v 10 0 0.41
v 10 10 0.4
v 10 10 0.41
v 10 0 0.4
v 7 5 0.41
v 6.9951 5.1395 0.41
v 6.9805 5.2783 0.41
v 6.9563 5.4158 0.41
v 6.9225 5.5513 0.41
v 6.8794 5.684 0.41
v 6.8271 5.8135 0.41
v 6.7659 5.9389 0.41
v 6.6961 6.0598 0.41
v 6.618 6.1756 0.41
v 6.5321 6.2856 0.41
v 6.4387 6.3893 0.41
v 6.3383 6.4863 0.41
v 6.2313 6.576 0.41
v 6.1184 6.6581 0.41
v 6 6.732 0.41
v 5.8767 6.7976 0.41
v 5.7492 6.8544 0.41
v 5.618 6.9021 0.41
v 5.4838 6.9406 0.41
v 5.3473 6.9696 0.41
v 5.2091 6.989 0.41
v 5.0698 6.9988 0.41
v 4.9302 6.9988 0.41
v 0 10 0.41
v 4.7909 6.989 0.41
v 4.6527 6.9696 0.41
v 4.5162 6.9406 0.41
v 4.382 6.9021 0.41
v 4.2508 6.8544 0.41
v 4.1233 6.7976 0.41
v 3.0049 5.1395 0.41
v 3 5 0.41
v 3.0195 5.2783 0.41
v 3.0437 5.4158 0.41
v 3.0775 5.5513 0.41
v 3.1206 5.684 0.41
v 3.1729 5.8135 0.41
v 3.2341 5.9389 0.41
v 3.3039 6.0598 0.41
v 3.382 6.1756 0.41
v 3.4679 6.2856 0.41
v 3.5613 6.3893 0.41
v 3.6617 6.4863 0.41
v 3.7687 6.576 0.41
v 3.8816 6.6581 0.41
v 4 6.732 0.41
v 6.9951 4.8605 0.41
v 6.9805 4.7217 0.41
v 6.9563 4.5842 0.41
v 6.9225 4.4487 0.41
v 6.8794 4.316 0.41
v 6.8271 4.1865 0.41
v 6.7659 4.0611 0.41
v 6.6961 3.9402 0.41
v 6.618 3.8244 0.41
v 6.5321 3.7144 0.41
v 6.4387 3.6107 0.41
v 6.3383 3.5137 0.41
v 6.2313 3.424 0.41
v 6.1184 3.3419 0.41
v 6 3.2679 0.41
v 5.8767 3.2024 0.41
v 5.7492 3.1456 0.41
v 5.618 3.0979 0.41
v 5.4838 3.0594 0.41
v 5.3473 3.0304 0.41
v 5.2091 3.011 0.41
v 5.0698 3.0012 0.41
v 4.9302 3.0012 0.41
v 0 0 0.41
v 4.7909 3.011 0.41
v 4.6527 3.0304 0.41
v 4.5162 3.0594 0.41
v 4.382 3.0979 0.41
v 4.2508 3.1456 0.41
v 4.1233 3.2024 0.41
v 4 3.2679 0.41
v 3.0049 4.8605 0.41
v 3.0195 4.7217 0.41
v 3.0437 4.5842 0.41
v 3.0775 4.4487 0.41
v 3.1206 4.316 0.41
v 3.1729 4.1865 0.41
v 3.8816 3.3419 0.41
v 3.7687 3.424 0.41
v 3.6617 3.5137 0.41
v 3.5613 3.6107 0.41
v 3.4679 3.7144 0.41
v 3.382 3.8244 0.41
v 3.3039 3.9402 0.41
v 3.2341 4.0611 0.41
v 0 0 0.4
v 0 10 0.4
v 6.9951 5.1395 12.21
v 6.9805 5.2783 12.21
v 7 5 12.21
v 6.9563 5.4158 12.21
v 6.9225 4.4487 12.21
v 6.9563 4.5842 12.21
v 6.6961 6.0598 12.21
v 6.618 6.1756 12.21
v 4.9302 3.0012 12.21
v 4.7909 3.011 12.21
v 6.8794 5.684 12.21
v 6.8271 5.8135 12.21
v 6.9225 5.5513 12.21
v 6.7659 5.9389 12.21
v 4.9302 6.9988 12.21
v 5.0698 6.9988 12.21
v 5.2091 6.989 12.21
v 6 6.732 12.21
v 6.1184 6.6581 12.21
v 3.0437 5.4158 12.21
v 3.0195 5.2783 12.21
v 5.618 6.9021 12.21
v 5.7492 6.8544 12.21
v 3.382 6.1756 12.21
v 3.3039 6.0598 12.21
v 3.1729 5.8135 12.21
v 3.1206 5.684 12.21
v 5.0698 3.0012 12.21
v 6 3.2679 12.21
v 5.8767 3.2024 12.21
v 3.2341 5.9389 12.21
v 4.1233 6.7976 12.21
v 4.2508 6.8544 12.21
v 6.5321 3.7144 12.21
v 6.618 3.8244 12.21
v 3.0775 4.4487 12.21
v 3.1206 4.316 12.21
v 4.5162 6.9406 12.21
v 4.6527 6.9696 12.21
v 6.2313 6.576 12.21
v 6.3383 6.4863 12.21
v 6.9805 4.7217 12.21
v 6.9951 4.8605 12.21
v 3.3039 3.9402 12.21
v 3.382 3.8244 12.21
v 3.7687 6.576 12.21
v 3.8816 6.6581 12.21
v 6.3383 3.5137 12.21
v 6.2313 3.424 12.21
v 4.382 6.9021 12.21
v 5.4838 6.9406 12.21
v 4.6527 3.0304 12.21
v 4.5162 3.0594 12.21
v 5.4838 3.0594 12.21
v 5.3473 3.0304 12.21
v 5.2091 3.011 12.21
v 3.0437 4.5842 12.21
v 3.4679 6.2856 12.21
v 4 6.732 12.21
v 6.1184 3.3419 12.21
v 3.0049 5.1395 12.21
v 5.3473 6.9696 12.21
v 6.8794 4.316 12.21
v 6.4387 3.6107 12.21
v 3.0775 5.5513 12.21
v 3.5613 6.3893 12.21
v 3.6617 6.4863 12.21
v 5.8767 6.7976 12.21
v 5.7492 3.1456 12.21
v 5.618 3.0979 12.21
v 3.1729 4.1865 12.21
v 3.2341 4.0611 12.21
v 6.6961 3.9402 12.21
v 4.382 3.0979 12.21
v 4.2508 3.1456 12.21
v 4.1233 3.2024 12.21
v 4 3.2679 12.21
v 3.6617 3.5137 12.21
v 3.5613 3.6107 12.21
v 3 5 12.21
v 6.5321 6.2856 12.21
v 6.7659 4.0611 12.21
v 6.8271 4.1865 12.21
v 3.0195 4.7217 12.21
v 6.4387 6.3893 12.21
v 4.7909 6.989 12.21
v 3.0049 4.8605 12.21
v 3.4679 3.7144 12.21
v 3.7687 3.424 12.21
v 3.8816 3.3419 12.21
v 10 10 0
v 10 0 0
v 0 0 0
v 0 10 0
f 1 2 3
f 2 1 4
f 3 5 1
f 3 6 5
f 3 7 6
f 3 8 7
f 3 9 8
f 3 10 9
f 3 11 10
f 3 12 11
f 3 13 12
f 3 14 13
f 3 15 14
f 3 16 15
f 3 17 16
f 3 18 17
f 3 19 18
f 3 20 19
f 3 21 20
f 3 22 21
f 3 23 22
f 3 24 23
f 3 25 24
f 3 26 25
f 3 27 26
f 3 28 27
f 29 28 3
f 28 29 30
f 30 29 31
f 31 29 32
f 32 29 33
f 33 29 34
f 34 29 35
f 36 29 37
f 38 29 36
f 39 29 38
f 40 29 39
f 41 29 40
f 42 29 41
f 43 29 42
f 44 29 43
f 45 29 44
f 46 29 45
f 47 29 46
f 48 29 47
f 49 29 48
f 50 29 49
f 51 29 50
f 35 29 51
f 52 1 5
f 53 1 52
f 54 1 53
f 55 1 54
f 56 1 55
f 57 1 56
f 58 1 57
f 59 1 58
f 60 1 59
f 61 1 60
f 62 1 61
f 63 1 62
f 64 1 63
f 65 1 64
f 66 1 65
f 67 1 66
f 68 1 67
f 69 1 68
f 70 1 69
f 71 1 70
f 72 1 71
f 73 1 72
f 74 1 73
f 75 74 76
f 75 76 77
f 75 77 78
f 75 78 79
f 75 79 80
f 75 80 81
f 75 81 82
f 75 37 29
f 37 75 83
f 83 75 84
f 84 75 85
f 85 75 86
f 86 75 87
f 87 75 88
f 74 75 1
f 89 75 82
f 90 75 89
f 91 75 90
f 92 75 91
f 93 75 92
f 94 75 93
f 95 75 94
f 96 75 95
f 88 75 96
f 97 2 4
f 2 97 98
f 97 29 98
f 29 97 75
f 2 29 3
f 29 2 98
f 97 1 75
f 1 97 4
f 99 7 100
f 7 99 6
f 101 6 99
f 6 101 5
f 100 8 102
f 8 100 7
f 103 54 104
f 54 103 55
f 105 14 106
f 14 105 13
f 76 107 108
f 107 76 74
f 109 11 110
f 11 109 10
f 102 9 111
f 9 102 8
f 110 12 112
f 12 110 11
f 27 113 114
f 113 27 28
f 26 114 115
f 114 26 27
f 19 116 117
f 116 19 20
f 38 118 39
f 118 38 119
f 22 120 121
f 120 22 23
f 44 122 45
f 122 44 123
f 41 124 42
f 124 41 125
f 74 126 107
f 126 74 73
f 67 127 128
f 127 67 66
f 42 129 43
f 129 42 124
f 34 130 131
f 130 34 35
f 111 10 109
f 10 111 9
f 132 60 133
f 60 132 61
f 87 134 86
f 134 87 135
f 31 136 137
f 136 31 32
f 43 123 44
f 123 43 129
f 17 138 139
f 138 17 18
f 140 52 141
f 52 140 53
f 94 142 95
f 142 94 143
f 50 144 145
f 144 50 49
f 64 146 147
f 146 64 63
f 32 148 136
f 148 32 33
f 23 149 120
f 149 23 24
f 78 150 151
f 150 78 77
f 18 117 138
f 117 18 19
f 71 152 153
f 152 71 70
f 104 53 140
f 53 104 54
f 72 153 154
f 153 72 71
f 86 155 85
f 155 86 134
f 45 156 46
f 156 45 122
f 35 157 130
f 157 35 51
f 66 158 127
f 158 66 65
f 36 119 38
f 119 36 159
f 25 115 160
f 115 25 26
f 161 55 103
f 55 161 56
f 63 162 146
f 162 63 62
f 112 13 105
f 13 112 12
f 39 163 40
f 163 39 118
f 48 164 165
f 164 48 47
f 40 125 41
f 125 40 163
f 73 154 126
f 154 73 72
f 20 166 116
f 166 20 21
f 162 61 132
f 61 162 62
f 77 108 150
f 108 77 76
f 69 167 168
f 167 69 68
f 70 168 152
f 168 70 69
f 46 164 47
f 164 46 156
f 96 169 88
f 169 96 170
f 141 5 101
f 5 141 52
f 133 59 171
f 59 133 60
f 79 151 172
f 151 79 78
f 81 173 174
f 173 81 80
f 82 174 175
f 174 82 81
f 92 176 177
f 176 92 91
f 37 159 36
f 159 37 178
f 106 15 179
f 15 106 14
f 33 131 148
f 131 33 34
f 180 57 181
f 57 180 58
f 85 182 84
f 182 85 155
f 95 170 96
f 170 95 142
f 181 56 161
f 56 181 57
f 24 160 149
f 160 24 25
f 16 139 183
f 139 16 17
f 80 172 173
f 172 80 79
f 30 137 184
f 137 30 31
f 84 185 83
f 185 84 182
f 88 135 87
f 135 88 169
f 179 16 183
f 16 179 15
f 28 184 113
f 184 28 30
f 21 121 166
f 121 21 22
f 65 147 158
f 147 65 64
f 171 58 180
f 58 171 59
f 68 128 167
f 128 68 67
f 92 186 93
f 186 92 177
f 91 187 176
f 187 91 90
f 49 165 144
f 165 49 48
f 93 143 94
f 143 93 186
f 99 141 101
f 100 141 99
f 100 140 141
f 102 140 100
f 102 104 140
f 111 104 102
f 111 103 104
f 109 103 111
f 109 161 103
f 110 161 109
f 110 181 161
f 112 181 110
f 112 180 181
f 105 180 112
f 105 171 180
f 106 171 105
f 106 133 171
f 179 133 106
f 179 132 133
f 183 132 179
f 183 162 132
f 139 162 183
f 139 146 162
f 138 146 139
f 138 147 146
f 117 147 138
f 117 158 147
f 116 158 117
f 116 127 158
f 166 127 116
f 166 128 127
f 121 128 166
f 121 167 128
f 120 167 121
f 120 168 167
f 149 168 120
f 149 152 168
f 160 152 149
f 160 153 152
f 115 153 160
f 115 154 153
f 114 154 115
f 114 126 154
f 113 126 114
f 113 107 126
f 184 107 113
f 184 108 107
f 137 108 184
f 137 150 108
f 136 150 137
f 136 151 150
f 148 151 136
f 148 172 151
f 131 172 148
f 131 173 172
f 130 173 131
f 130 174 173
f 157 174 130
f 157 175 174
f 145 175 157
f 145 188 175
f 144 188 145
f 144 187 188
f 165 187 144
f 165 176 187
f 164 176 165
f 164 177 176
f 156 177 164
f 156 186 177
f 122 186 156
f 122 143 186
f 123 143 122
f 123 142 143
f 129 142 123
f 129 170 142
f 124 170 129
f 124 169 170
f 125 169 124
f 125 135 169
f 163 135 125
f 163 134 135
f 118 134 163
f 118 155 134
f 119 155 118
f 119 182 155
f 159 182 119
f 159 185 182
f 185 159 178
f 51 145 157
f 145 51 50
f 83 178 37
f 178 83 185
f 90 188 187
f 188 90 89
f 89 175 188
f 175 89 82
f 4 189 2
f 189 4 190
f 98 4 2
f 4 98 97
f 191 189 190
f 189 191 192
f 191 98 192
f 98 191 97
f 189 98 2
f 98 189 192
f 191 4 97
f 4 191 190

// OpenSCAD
// file: ../../Base/Rotation.scad
// Fischertechnik Box Foundation
// Geometry Helpers Rotation

include <PlacementOptions.scad>

// getRotatedSpace(space, rotation=NoRotation)
// Rotates the space dependent on the specified rotation

function getRotatedSpace(space, rotation=NoRotation) = [
    (rotation == Rotate90 || rotation == Rotate270) ? space.y : space.x,
    (rotation == Rotate90 || rotation == Rotate270) ? space.x : space.y
];

// Rotates the given space around the fixed left lower corner
// space = the space the children needs as width/depth list [width,depth]
// rotation = 0 Rotate0 degrees, 1 Rotate90 degrees, 2 Rotate180 degrees, 3 Rotate270 degrees (equivalent to -90)

module RotateFix(space, rotation=NoRotation) {
    dy = (rotation == Rotate0 || rotation == Rotate270) ? 0 :
        (rotation == Rotate90) ? space.x :
        space.y;
    dx = (rotation < Rotate180) ? 0 :
        (rotation == Rotate180) ? space.x :
        space.y;
    
    translate([dx, dy, 0])
        rotate([0, 0, rotations[rotation]])
            children();
}
// file: ../../Base/Alignment.scad
// Fischertechnik Box Foundation
// Geometry Helpers Alignment

include <PlacementOptions.scad>

// getAlignedX(elementWidth, spaceWidth, align=AlignRight, offset=0)
// Gets the aligned X offset of an element with the given
// width in the given space.
// elementWidth = The width of the element to positon
// spaceWidth = The space where the element should be aligned
// align = 0 AlignLeft, 1 AlignCenter, 2 AlignRight
// offset = an optional offset from the aligned position. When
// aligned left or centered, then positive values are in X direction.
// When aligned right then positive values are in negative X direction.

function getAlignedX(elementWidth, spaceWidth, align=AlignRight, offset=0) =
    (align == AlignLeft) ?
        offset :
        ((align == AlignCenter) ?
        (spaceWidth - elementWidth)/2 + offset :
        spaceWidth - offset - elementWidth);

// getAlignedY(elementDepth, spaceDepth, align=AlignTop, offset=0)
// Gets the aligned Y offset of an element with the given
// depth in the given space.
// elementDepth = The depth of the element to positon
// spaceDepth = The space where the element should be aligned
// align = 0 AlignBottom, 1 AlignCenter, 2 AlignTop
// offset = an optional offset from the aligned position. When
// aligned bottom or centered, then positive values are in Y direction.
// When aligned top then positive values are in negative Y direction.

function getAlignedY(elementDepth, spaceDepth, align=AlignTop, offset=0) =
    (align == AlignBottom) ?
        offset :
        ((align == AlignCenter) ?
        (spaceDepth - elementDepth)/2 + offset :
        spaceDepth - offset - elementDepth);
// file: ../../Base/PlacementOptions.scad
// Fischertechnik Box Foundation
// Placement Options

// Alignment
NoAlign = 0;
AlignLeft = 1;
AlignBottom = 2;
AlignCenter = 3;
AlignRight = 4;
AlignTop = 5;

// Element rotation degree steps
rotations = [0, -90, -180, -270];

// Rotation
NoRotation = 0;
Rotate0 = 0;
Rotate90 = 1;
Rotate180 = 2;
Rotate270 = 3;

// Docking (seen from above)
NoDock = -1;
DockLeft = 0;
DockTop = 1;
DockRight = 2;
DockCorner = 2;
DockBottom = 3;

// Web corners
LowerLeft = 0;
UpperLeft = 1;
UpperRight = 2;
LowerRight = 3;

// Web position relative to corner
LeftOfCorner = 0;
RightOfCorner = 1;
// file: ../../Base/Boxes.scad
// Fischertechnik Box Foundation
// Pre-designed Boxes

use <Constants.scad>

include <PlacementOptions.scad>

box190Width = 190;
box190Depth = 130;
box130Width = 130;
box130Depth = 95;

// Values are from an original ec3 box
topBottomDifference = 1.5;
outerHeight = 40;
innerHeight = 38.2;
baseThickness = outerHeight - innerHeight;
stackExcess = 5.7;
radius = 3.5;
wallThickness = 1.5;
tolerance = 0.2;
stackOffset = innerHeight - stackExcess;

boxUsageHeight = stackOffset;
boxWallThickness = wallThickness;
boxBaseThickness = baseThickness;
boxWebWidth = 3.0;

// getBoxWallThickness()
// Gets the wall thickness of a Fischertechnik Box
function getBoxWallThickness() = boxWallThickness;

// getBoxUsageHeight()
// Gets the usable height of a Fischertechnik box
function getBoxUsageHeight() = boxUsageHeight;

// getBoxInnerHeight()
// Gets the inner height of a Fischertechnik box, including the stack excess
function getBoxInnerHeight() = innerHeight;

// getBoxBaseThickness()
// Gets the thickness of the Fischertechnik box base.
function getBoxBaseThickness() = boxBaseThickness;

// getBoxWebWidth()
// Gets the width of a box web
function getBoxWebWidth() = boxWebWidth;

// getBox190Space()
// Gets the usable inner space of a Box 190 as an x/y-list
function getBox190Space() = [
    box190Width - 2*getBoxWallThickness() - topBottomDifference, 
    box190Depth - 2*getBoxWallThickness() - topBottomDifference ];

// BoxBase(width, depth)
// Creates an empty stackable Fischertechnik compatible box
// width = Outer width of the box (190, 130, ...)
// depth = Outer depth of the box (130, 95, ...)

module BoxBase(width, depth, height=outerHeight) {    
    thinPlate = 0.01;

    innerHeight = height - baseThickness;    
    
    module BodyPlate(width, depth) {
        translate([radius, radius])
        hull() {
            w = width-2*radius;
            d = depth-2*radius;
            cube([w, d, thinPlate]);
            cylinder(thinPlate, r=radius, $fn=getFragments());
            translate([w, 0])
                cylinder(thinPlate, r=radius, $fn=getFragments());
            translate([w, d])
                cylinder(thinPlate, r=radius, $fn=getFragments());
            translate([0, d])
                cylinder(thinPlate, r=radius, $fn=getFragments());
        }
    }
    
    module Body(tolerance=tolerance) {
        hull() {
            // Bottom with tolerance to fit into the original boxes when stacked
            translate([-wallThickness+tolerance, -wallThickness+tolerance, -baseThickness])
                BodyPlate(width-topBottomDifference-2*tolerance, depth-topBottomDifference-2*tolerance);
            
            // Top
            translate([-wallThickness-topBottomDifference/2, -wallThickness-topBottomDifference/2, innerHeight-thinPlate])
                BodyPlate(width, depth);
         }
    }

    module Cutoff() {
        hull() {
            coWidth = width - 2*wallThickness;
            coDepth = depth - 2*wallThickness;
            
            // Bottom
            BodyPlate(coWidth-topBottomDifference, coDepth-topBottomDifference);

            // Top
            translate([-topBottomDifference/2, -topBottomDifference/2, innerHeight+thinPlate]) 
                BodyPlate(coWidth, coDepth);
        }
    }
    
    difference() {        
        Body();
        Cutoff();
        stackOffset = innerHeight - stackExcess;
        translate([0, 0, stackOffset + baseThickness])
            Body(tolerance=0);
    }
}

// Creates the Fischertechnik empty box 130x190 mm and places it at position 0,0
// 190x130 are the outer sizes, the inner space is slightly smaller. Use getBox190Space() to get the inner sizes.
// The box is positioned that the usable inner space is at the 0,0,0 position. The

module Box190() {
    BoxBase(box190Width, box190Depth);
}

// Gets the usable inner space of a Box 130 as an x/y-list
function getBox130Space() = [
    box130Width - 2*getBoxWallThickness() - topBottomDifference, 
    box130Depth - 2*getBoxWallThickness() - topBottomDifference ];

// Creates the Fischertechnik empty box 95x130 mm and places it at position 0,0
// 190x130 are the outer sizes, the inner space is slightly smaller. Use getBox190Space() to get the inner sizes.
// The box is positioned that the usable inner space is at the 0,0,0 position. The

module Box130() {
    BoxBase(box130Width, box130Depth);
}

// Creates a web at the specified box walls
// corner 0 = LowerLeft, 1 = UpperLeft, 2 = UpperRight, 3 = LowerRight
// side 0 = LeftOfCorner, 1 = RightOfCorner
// distance = Distance in mm from the corner
// boxSpace = inner width and depth of the box (default: Box 190)
// webWidth = length of the web (default is 3 mms)
// webThickness = thickness of the web (default is 1 mm)

module BoxWeb(corner, side, distance, boxSpace=getBox190Space(), webWidth=getBoxWebWidth(), webThickness=1.0) {
    sink = getBoxWallThickness()/2;

    width = (corner % 2 == 0) ? 
            (side == LeftOfCorner ? webWidth : webThickness) :
            (side == LeftOfCorner ? webThickness : webWidth);

    depth = (corner % 2 == 0) ? 
            (side == RightOfCorner ? webWidth : webThickness) :
            (side == RightOfCorner ? webThickness : webWidth);
    
    xDiff = corner == LowerLeft ? 
                (side == LeftOfCorner ? -sink : distance) :
            (corner == UpperLeft ?                
                (side == LeftOfCorner ? distance : -sink) :
            (corner == UpperRight ?
                (side == LeftOfCorner ? boxSpace.x-webWidth+sink : boxSpace.x-distance-webThickness) :
                (side == LeftOfCorner ? boxSpace.x-distance-webThickness: boxSpace.x-webWidth+sink)));

    yDiff = corner == LowerLeft ? 
                (side == RightOfCorner ? -sink : distance) :
            (corner == UpperLeft ?
                (side == RightOfCorner ? boxSpace.y-distance : boxSpace.y-webWidth+sink) :
            (corner == UpperRight ?
                (side == RightOfCorner ? boxSpace.y-webWidth+sink : boxSpace.y-distance) :
                (side == RightOfCorner ? distance : -sink)));
    
    translate([xDiff, yDiff, -getExcess()])
        cube([width, depth, boxUsageHeight + 2*getExcess()]);
}
// file: ../../Base/Placement.scad
// Fischertechnik Box Foundation
// Geometry Helpers Placement

use <Constants.scad>
use <Alignment.scad>
use <Rotation.scad>
use <Boxes.scad>

include <PlacementOptions.scad>

// Place(x=0, y=0, elementSpace=[0,0], alignX=AlignLeft, alignY=AlignBottom, rotation=Rotate0, boxSpace=getBox190Space())
// Places the child at the specified position
// y = Y-Position. This is a relative position when an X aligment is specified.
// x = X-Position. This is a relative position when an Y aligment is specified.
// elementSpace = space of the element to be placed [x,y]
// alignX = -1=NoAlign, 0 AlignLeft, 1 AlignCenter, 3 AlignRight (elementSpace and boxSpace required!)
// alignY = -1=NoAlign, 2 AlignBottom, 1 AlignCenter, 4 AlignTop (elementSpace and boxSpace required!)
// rotation = 0 Rotate0 0 degrees, 1 Rotate90 90 degrees, 
// 2 Rotate180 180 degrees, 3 Rotate270 270 degrees (equivalent to -90)
// boxSpace = Inner space of the box where the placement occurs [x,y] - default is Box 190x130 inner space

module Place(x=0, y=0, elementSpace=[0,0], 
  alignX=AlignLeft, alignY=AlignBottom, 
  rotation=NoRotation, boxSpace=getBox190Space()) {

    module Position(x, y, space, rotation=Rotate0) {
        translate([x, y, 0])
            RotateFix(space, rotation)
                children();
    }

    space = getRotatedSpace(elementSpace, rotation);
    alignedX = getAlignedX(space.x, boxSpace.x, alignX, x);
    alignedY = getAlignedY(space.y, boxSpace.y, alignY, y);
    Position(alignedX, alignedY, elementSpace, rotation)
        children();
}

// Center(space=getBox130Space(), elementSpace=[0,0])
// space = Space where the children is centered. For cylinder use centered=true and no elementSpace.
// elementSpace = space of the element to be centered [x,y]

module Center(space=getBox190Space(), elementSpace=[0,0]) {
    Place(elementSpace=elementSpace, boxSpace=space, alignX=AlignCenter, alignY=AlignCenter)
        children();
}

// CenterHorizontal(width=0, y=0, offset=0, space=getBox130Space())
// width = Width of the element to be placed.
// y = Y position of the element
// offset = Offset from the center position (negative will be left of the center)
// space = Space where the element is placed

module CenterHorizontal(width=0, y=0, offset=0, space=getBox190Space()) {
    Place(x=offset, y=y, elementSpace=[width, 0], boxSpace=space, alignX=AlignCenter)
        children(0);
}

// CenterVertical(depth=0, x=0, offset=0, space=getBox130Space())
// depth = Depth of the element to be placed.
// x = X position of the element
// offset = Offset from the center position (negative will be down of the center)
// space = Space where the element is placed

module CenterVertical(depth=0, x=0, offset=0, space=getBox190Space()) {
    Place(x=x, y=offset, elementSpace=[0, depth], boxSpace=space, alignY=AlignCenter)
        children(0);
}

// getIsVertical(align)
// True if the specified alignment needs a vertical orientation for a divider (AlignRight, AlignLeft)

function getIsVertical(align) = (align == AlignRight || align == AlignLeft);

// getIsHorizontal(align)
// True if the specified alignment needs a horizontal orientation for a divider (AlignTop, AlignBottom)

function getIsHorizontal(align) = (align == AlignTop || align == AlignBottom);
// file: ../../Elements/AxisClip10.scad
// Fischertechnik Box Library
// Axis for clip 10
// 31023

use <../ModelBase/Simple.scad>
use <../Base/Constants.scad>

width = 12;
depth = 12;
height = 23;
upperDiameter = 3.7;

// getAxisClip10Space()
// Gets the space of a frame for a clip 10 with spring ring (mot2)

function getAxisClip10Space() = [width, depth, height];

// AxisClip10()
// Axis for clip 10 with spring ring (mot2)

module AxisClip10() {
    LeveledAxisWithSpace(height, height-10, getAxisClip10Space(), diameter=upperDiameter);
}

// Tests
color("lightgray")
AxisClip10();
// file: ../../Base/Constants.scad
// Fischertechnik Box Foundation
// Constants

// Constant values necessary for multiple elements

// Base constants
dividerThickness = 1.2;
excess = 0.01;
fragments = 90;
tolerance = 0.8;

// Gets the thickness of a divider 
function getDividerThickness() = dividerThickness;

// Gets the excess that is used to merge walls into each other
function getExcess() = excess;

// Gets amount of fragments of a cylinder
function getFragments() = fragments;

// Gets the inner tolerance of a frame to each side
function getTolerance() = tolerance;


// Fischertechnik specific constants
axisDiameter = 4;
axisBottomDiameter = axisDiameter + 1;
standardEdgeDistance = 2.5;
standardWebDistance = 11.5;
standardCornerLength = 15;
tubeWallFactor = 0.8;
smallPartsFrameHeight = 20;

// Gets axis diameter
function getAxisDiameter() = axisDiameter;

// Gets axis bottom diameter for thicker part at the bottom
function getAxisBottomDiameter() = axisBottomDiameter;

// gets the standard distance to the wall of the box for dockable frames with webs
function getStandardEdgeDistance() = standardEdgeDistance;

// gets the standard distance of each web to the corner of the dockable frame
function getStandardWebDistance() = standardWebDistance;

// gets the standard length of the corner walls of a dockable frame
function getStandardCornerLength() = standardCornerLength;

// gets the wall thickness of a tube.
function getTubeWallThickness() = tubeWallFactor * getDividerThickness();

// gets the frame height for docked small parts boxes.
function getSmallPartsFrameHeight() = smallPartsFrameHeight;
// file: ../../Elements/AxisCoupling.scad
// Fischertechnik Box Library
// Axis for Coupling
// 31024, 31047

use <../Base/Constants.scad>
use <../ModelBase/Simple.scad>

space = 10;

// getAxisCouplingSpace()
// Gets the space the axis coupling needs as width and depth (.x and .y as a list)

function getAxisCouplingSpace() = [space, space];

// AxisCoupling()
// Standing axis for an 8 mm coupling 31024

module AxisCoupling() {
    axisHeight = 11.8;
    AxisWithSpace(axisHeight, getAxisCouplingSpace());
}

// Tests
color("lightgray")
AxisCoupling();
// file: ../TestPrint.scad
// 3D Print Test Base

use <../Base/Constants.scad>

use <../Elements/AxisClip10.scad>

module TestPrint(elementSpace) {
    cube([elementSpace.x, elementSpace.y, 0.4]);
    translate([0,0,0.4+getExcess()]) {
        children();
    }
}

TestPrint(getAxisClip10Space())
    AxisClip10();
// main file
// 3D Print Test
// AxisCoupling

use <../TestPrint.scad>
use <../../Elements/AxisCoupling.scad>

TestPrint(getAxisCouplingSpace())
    AxisCoupling();
